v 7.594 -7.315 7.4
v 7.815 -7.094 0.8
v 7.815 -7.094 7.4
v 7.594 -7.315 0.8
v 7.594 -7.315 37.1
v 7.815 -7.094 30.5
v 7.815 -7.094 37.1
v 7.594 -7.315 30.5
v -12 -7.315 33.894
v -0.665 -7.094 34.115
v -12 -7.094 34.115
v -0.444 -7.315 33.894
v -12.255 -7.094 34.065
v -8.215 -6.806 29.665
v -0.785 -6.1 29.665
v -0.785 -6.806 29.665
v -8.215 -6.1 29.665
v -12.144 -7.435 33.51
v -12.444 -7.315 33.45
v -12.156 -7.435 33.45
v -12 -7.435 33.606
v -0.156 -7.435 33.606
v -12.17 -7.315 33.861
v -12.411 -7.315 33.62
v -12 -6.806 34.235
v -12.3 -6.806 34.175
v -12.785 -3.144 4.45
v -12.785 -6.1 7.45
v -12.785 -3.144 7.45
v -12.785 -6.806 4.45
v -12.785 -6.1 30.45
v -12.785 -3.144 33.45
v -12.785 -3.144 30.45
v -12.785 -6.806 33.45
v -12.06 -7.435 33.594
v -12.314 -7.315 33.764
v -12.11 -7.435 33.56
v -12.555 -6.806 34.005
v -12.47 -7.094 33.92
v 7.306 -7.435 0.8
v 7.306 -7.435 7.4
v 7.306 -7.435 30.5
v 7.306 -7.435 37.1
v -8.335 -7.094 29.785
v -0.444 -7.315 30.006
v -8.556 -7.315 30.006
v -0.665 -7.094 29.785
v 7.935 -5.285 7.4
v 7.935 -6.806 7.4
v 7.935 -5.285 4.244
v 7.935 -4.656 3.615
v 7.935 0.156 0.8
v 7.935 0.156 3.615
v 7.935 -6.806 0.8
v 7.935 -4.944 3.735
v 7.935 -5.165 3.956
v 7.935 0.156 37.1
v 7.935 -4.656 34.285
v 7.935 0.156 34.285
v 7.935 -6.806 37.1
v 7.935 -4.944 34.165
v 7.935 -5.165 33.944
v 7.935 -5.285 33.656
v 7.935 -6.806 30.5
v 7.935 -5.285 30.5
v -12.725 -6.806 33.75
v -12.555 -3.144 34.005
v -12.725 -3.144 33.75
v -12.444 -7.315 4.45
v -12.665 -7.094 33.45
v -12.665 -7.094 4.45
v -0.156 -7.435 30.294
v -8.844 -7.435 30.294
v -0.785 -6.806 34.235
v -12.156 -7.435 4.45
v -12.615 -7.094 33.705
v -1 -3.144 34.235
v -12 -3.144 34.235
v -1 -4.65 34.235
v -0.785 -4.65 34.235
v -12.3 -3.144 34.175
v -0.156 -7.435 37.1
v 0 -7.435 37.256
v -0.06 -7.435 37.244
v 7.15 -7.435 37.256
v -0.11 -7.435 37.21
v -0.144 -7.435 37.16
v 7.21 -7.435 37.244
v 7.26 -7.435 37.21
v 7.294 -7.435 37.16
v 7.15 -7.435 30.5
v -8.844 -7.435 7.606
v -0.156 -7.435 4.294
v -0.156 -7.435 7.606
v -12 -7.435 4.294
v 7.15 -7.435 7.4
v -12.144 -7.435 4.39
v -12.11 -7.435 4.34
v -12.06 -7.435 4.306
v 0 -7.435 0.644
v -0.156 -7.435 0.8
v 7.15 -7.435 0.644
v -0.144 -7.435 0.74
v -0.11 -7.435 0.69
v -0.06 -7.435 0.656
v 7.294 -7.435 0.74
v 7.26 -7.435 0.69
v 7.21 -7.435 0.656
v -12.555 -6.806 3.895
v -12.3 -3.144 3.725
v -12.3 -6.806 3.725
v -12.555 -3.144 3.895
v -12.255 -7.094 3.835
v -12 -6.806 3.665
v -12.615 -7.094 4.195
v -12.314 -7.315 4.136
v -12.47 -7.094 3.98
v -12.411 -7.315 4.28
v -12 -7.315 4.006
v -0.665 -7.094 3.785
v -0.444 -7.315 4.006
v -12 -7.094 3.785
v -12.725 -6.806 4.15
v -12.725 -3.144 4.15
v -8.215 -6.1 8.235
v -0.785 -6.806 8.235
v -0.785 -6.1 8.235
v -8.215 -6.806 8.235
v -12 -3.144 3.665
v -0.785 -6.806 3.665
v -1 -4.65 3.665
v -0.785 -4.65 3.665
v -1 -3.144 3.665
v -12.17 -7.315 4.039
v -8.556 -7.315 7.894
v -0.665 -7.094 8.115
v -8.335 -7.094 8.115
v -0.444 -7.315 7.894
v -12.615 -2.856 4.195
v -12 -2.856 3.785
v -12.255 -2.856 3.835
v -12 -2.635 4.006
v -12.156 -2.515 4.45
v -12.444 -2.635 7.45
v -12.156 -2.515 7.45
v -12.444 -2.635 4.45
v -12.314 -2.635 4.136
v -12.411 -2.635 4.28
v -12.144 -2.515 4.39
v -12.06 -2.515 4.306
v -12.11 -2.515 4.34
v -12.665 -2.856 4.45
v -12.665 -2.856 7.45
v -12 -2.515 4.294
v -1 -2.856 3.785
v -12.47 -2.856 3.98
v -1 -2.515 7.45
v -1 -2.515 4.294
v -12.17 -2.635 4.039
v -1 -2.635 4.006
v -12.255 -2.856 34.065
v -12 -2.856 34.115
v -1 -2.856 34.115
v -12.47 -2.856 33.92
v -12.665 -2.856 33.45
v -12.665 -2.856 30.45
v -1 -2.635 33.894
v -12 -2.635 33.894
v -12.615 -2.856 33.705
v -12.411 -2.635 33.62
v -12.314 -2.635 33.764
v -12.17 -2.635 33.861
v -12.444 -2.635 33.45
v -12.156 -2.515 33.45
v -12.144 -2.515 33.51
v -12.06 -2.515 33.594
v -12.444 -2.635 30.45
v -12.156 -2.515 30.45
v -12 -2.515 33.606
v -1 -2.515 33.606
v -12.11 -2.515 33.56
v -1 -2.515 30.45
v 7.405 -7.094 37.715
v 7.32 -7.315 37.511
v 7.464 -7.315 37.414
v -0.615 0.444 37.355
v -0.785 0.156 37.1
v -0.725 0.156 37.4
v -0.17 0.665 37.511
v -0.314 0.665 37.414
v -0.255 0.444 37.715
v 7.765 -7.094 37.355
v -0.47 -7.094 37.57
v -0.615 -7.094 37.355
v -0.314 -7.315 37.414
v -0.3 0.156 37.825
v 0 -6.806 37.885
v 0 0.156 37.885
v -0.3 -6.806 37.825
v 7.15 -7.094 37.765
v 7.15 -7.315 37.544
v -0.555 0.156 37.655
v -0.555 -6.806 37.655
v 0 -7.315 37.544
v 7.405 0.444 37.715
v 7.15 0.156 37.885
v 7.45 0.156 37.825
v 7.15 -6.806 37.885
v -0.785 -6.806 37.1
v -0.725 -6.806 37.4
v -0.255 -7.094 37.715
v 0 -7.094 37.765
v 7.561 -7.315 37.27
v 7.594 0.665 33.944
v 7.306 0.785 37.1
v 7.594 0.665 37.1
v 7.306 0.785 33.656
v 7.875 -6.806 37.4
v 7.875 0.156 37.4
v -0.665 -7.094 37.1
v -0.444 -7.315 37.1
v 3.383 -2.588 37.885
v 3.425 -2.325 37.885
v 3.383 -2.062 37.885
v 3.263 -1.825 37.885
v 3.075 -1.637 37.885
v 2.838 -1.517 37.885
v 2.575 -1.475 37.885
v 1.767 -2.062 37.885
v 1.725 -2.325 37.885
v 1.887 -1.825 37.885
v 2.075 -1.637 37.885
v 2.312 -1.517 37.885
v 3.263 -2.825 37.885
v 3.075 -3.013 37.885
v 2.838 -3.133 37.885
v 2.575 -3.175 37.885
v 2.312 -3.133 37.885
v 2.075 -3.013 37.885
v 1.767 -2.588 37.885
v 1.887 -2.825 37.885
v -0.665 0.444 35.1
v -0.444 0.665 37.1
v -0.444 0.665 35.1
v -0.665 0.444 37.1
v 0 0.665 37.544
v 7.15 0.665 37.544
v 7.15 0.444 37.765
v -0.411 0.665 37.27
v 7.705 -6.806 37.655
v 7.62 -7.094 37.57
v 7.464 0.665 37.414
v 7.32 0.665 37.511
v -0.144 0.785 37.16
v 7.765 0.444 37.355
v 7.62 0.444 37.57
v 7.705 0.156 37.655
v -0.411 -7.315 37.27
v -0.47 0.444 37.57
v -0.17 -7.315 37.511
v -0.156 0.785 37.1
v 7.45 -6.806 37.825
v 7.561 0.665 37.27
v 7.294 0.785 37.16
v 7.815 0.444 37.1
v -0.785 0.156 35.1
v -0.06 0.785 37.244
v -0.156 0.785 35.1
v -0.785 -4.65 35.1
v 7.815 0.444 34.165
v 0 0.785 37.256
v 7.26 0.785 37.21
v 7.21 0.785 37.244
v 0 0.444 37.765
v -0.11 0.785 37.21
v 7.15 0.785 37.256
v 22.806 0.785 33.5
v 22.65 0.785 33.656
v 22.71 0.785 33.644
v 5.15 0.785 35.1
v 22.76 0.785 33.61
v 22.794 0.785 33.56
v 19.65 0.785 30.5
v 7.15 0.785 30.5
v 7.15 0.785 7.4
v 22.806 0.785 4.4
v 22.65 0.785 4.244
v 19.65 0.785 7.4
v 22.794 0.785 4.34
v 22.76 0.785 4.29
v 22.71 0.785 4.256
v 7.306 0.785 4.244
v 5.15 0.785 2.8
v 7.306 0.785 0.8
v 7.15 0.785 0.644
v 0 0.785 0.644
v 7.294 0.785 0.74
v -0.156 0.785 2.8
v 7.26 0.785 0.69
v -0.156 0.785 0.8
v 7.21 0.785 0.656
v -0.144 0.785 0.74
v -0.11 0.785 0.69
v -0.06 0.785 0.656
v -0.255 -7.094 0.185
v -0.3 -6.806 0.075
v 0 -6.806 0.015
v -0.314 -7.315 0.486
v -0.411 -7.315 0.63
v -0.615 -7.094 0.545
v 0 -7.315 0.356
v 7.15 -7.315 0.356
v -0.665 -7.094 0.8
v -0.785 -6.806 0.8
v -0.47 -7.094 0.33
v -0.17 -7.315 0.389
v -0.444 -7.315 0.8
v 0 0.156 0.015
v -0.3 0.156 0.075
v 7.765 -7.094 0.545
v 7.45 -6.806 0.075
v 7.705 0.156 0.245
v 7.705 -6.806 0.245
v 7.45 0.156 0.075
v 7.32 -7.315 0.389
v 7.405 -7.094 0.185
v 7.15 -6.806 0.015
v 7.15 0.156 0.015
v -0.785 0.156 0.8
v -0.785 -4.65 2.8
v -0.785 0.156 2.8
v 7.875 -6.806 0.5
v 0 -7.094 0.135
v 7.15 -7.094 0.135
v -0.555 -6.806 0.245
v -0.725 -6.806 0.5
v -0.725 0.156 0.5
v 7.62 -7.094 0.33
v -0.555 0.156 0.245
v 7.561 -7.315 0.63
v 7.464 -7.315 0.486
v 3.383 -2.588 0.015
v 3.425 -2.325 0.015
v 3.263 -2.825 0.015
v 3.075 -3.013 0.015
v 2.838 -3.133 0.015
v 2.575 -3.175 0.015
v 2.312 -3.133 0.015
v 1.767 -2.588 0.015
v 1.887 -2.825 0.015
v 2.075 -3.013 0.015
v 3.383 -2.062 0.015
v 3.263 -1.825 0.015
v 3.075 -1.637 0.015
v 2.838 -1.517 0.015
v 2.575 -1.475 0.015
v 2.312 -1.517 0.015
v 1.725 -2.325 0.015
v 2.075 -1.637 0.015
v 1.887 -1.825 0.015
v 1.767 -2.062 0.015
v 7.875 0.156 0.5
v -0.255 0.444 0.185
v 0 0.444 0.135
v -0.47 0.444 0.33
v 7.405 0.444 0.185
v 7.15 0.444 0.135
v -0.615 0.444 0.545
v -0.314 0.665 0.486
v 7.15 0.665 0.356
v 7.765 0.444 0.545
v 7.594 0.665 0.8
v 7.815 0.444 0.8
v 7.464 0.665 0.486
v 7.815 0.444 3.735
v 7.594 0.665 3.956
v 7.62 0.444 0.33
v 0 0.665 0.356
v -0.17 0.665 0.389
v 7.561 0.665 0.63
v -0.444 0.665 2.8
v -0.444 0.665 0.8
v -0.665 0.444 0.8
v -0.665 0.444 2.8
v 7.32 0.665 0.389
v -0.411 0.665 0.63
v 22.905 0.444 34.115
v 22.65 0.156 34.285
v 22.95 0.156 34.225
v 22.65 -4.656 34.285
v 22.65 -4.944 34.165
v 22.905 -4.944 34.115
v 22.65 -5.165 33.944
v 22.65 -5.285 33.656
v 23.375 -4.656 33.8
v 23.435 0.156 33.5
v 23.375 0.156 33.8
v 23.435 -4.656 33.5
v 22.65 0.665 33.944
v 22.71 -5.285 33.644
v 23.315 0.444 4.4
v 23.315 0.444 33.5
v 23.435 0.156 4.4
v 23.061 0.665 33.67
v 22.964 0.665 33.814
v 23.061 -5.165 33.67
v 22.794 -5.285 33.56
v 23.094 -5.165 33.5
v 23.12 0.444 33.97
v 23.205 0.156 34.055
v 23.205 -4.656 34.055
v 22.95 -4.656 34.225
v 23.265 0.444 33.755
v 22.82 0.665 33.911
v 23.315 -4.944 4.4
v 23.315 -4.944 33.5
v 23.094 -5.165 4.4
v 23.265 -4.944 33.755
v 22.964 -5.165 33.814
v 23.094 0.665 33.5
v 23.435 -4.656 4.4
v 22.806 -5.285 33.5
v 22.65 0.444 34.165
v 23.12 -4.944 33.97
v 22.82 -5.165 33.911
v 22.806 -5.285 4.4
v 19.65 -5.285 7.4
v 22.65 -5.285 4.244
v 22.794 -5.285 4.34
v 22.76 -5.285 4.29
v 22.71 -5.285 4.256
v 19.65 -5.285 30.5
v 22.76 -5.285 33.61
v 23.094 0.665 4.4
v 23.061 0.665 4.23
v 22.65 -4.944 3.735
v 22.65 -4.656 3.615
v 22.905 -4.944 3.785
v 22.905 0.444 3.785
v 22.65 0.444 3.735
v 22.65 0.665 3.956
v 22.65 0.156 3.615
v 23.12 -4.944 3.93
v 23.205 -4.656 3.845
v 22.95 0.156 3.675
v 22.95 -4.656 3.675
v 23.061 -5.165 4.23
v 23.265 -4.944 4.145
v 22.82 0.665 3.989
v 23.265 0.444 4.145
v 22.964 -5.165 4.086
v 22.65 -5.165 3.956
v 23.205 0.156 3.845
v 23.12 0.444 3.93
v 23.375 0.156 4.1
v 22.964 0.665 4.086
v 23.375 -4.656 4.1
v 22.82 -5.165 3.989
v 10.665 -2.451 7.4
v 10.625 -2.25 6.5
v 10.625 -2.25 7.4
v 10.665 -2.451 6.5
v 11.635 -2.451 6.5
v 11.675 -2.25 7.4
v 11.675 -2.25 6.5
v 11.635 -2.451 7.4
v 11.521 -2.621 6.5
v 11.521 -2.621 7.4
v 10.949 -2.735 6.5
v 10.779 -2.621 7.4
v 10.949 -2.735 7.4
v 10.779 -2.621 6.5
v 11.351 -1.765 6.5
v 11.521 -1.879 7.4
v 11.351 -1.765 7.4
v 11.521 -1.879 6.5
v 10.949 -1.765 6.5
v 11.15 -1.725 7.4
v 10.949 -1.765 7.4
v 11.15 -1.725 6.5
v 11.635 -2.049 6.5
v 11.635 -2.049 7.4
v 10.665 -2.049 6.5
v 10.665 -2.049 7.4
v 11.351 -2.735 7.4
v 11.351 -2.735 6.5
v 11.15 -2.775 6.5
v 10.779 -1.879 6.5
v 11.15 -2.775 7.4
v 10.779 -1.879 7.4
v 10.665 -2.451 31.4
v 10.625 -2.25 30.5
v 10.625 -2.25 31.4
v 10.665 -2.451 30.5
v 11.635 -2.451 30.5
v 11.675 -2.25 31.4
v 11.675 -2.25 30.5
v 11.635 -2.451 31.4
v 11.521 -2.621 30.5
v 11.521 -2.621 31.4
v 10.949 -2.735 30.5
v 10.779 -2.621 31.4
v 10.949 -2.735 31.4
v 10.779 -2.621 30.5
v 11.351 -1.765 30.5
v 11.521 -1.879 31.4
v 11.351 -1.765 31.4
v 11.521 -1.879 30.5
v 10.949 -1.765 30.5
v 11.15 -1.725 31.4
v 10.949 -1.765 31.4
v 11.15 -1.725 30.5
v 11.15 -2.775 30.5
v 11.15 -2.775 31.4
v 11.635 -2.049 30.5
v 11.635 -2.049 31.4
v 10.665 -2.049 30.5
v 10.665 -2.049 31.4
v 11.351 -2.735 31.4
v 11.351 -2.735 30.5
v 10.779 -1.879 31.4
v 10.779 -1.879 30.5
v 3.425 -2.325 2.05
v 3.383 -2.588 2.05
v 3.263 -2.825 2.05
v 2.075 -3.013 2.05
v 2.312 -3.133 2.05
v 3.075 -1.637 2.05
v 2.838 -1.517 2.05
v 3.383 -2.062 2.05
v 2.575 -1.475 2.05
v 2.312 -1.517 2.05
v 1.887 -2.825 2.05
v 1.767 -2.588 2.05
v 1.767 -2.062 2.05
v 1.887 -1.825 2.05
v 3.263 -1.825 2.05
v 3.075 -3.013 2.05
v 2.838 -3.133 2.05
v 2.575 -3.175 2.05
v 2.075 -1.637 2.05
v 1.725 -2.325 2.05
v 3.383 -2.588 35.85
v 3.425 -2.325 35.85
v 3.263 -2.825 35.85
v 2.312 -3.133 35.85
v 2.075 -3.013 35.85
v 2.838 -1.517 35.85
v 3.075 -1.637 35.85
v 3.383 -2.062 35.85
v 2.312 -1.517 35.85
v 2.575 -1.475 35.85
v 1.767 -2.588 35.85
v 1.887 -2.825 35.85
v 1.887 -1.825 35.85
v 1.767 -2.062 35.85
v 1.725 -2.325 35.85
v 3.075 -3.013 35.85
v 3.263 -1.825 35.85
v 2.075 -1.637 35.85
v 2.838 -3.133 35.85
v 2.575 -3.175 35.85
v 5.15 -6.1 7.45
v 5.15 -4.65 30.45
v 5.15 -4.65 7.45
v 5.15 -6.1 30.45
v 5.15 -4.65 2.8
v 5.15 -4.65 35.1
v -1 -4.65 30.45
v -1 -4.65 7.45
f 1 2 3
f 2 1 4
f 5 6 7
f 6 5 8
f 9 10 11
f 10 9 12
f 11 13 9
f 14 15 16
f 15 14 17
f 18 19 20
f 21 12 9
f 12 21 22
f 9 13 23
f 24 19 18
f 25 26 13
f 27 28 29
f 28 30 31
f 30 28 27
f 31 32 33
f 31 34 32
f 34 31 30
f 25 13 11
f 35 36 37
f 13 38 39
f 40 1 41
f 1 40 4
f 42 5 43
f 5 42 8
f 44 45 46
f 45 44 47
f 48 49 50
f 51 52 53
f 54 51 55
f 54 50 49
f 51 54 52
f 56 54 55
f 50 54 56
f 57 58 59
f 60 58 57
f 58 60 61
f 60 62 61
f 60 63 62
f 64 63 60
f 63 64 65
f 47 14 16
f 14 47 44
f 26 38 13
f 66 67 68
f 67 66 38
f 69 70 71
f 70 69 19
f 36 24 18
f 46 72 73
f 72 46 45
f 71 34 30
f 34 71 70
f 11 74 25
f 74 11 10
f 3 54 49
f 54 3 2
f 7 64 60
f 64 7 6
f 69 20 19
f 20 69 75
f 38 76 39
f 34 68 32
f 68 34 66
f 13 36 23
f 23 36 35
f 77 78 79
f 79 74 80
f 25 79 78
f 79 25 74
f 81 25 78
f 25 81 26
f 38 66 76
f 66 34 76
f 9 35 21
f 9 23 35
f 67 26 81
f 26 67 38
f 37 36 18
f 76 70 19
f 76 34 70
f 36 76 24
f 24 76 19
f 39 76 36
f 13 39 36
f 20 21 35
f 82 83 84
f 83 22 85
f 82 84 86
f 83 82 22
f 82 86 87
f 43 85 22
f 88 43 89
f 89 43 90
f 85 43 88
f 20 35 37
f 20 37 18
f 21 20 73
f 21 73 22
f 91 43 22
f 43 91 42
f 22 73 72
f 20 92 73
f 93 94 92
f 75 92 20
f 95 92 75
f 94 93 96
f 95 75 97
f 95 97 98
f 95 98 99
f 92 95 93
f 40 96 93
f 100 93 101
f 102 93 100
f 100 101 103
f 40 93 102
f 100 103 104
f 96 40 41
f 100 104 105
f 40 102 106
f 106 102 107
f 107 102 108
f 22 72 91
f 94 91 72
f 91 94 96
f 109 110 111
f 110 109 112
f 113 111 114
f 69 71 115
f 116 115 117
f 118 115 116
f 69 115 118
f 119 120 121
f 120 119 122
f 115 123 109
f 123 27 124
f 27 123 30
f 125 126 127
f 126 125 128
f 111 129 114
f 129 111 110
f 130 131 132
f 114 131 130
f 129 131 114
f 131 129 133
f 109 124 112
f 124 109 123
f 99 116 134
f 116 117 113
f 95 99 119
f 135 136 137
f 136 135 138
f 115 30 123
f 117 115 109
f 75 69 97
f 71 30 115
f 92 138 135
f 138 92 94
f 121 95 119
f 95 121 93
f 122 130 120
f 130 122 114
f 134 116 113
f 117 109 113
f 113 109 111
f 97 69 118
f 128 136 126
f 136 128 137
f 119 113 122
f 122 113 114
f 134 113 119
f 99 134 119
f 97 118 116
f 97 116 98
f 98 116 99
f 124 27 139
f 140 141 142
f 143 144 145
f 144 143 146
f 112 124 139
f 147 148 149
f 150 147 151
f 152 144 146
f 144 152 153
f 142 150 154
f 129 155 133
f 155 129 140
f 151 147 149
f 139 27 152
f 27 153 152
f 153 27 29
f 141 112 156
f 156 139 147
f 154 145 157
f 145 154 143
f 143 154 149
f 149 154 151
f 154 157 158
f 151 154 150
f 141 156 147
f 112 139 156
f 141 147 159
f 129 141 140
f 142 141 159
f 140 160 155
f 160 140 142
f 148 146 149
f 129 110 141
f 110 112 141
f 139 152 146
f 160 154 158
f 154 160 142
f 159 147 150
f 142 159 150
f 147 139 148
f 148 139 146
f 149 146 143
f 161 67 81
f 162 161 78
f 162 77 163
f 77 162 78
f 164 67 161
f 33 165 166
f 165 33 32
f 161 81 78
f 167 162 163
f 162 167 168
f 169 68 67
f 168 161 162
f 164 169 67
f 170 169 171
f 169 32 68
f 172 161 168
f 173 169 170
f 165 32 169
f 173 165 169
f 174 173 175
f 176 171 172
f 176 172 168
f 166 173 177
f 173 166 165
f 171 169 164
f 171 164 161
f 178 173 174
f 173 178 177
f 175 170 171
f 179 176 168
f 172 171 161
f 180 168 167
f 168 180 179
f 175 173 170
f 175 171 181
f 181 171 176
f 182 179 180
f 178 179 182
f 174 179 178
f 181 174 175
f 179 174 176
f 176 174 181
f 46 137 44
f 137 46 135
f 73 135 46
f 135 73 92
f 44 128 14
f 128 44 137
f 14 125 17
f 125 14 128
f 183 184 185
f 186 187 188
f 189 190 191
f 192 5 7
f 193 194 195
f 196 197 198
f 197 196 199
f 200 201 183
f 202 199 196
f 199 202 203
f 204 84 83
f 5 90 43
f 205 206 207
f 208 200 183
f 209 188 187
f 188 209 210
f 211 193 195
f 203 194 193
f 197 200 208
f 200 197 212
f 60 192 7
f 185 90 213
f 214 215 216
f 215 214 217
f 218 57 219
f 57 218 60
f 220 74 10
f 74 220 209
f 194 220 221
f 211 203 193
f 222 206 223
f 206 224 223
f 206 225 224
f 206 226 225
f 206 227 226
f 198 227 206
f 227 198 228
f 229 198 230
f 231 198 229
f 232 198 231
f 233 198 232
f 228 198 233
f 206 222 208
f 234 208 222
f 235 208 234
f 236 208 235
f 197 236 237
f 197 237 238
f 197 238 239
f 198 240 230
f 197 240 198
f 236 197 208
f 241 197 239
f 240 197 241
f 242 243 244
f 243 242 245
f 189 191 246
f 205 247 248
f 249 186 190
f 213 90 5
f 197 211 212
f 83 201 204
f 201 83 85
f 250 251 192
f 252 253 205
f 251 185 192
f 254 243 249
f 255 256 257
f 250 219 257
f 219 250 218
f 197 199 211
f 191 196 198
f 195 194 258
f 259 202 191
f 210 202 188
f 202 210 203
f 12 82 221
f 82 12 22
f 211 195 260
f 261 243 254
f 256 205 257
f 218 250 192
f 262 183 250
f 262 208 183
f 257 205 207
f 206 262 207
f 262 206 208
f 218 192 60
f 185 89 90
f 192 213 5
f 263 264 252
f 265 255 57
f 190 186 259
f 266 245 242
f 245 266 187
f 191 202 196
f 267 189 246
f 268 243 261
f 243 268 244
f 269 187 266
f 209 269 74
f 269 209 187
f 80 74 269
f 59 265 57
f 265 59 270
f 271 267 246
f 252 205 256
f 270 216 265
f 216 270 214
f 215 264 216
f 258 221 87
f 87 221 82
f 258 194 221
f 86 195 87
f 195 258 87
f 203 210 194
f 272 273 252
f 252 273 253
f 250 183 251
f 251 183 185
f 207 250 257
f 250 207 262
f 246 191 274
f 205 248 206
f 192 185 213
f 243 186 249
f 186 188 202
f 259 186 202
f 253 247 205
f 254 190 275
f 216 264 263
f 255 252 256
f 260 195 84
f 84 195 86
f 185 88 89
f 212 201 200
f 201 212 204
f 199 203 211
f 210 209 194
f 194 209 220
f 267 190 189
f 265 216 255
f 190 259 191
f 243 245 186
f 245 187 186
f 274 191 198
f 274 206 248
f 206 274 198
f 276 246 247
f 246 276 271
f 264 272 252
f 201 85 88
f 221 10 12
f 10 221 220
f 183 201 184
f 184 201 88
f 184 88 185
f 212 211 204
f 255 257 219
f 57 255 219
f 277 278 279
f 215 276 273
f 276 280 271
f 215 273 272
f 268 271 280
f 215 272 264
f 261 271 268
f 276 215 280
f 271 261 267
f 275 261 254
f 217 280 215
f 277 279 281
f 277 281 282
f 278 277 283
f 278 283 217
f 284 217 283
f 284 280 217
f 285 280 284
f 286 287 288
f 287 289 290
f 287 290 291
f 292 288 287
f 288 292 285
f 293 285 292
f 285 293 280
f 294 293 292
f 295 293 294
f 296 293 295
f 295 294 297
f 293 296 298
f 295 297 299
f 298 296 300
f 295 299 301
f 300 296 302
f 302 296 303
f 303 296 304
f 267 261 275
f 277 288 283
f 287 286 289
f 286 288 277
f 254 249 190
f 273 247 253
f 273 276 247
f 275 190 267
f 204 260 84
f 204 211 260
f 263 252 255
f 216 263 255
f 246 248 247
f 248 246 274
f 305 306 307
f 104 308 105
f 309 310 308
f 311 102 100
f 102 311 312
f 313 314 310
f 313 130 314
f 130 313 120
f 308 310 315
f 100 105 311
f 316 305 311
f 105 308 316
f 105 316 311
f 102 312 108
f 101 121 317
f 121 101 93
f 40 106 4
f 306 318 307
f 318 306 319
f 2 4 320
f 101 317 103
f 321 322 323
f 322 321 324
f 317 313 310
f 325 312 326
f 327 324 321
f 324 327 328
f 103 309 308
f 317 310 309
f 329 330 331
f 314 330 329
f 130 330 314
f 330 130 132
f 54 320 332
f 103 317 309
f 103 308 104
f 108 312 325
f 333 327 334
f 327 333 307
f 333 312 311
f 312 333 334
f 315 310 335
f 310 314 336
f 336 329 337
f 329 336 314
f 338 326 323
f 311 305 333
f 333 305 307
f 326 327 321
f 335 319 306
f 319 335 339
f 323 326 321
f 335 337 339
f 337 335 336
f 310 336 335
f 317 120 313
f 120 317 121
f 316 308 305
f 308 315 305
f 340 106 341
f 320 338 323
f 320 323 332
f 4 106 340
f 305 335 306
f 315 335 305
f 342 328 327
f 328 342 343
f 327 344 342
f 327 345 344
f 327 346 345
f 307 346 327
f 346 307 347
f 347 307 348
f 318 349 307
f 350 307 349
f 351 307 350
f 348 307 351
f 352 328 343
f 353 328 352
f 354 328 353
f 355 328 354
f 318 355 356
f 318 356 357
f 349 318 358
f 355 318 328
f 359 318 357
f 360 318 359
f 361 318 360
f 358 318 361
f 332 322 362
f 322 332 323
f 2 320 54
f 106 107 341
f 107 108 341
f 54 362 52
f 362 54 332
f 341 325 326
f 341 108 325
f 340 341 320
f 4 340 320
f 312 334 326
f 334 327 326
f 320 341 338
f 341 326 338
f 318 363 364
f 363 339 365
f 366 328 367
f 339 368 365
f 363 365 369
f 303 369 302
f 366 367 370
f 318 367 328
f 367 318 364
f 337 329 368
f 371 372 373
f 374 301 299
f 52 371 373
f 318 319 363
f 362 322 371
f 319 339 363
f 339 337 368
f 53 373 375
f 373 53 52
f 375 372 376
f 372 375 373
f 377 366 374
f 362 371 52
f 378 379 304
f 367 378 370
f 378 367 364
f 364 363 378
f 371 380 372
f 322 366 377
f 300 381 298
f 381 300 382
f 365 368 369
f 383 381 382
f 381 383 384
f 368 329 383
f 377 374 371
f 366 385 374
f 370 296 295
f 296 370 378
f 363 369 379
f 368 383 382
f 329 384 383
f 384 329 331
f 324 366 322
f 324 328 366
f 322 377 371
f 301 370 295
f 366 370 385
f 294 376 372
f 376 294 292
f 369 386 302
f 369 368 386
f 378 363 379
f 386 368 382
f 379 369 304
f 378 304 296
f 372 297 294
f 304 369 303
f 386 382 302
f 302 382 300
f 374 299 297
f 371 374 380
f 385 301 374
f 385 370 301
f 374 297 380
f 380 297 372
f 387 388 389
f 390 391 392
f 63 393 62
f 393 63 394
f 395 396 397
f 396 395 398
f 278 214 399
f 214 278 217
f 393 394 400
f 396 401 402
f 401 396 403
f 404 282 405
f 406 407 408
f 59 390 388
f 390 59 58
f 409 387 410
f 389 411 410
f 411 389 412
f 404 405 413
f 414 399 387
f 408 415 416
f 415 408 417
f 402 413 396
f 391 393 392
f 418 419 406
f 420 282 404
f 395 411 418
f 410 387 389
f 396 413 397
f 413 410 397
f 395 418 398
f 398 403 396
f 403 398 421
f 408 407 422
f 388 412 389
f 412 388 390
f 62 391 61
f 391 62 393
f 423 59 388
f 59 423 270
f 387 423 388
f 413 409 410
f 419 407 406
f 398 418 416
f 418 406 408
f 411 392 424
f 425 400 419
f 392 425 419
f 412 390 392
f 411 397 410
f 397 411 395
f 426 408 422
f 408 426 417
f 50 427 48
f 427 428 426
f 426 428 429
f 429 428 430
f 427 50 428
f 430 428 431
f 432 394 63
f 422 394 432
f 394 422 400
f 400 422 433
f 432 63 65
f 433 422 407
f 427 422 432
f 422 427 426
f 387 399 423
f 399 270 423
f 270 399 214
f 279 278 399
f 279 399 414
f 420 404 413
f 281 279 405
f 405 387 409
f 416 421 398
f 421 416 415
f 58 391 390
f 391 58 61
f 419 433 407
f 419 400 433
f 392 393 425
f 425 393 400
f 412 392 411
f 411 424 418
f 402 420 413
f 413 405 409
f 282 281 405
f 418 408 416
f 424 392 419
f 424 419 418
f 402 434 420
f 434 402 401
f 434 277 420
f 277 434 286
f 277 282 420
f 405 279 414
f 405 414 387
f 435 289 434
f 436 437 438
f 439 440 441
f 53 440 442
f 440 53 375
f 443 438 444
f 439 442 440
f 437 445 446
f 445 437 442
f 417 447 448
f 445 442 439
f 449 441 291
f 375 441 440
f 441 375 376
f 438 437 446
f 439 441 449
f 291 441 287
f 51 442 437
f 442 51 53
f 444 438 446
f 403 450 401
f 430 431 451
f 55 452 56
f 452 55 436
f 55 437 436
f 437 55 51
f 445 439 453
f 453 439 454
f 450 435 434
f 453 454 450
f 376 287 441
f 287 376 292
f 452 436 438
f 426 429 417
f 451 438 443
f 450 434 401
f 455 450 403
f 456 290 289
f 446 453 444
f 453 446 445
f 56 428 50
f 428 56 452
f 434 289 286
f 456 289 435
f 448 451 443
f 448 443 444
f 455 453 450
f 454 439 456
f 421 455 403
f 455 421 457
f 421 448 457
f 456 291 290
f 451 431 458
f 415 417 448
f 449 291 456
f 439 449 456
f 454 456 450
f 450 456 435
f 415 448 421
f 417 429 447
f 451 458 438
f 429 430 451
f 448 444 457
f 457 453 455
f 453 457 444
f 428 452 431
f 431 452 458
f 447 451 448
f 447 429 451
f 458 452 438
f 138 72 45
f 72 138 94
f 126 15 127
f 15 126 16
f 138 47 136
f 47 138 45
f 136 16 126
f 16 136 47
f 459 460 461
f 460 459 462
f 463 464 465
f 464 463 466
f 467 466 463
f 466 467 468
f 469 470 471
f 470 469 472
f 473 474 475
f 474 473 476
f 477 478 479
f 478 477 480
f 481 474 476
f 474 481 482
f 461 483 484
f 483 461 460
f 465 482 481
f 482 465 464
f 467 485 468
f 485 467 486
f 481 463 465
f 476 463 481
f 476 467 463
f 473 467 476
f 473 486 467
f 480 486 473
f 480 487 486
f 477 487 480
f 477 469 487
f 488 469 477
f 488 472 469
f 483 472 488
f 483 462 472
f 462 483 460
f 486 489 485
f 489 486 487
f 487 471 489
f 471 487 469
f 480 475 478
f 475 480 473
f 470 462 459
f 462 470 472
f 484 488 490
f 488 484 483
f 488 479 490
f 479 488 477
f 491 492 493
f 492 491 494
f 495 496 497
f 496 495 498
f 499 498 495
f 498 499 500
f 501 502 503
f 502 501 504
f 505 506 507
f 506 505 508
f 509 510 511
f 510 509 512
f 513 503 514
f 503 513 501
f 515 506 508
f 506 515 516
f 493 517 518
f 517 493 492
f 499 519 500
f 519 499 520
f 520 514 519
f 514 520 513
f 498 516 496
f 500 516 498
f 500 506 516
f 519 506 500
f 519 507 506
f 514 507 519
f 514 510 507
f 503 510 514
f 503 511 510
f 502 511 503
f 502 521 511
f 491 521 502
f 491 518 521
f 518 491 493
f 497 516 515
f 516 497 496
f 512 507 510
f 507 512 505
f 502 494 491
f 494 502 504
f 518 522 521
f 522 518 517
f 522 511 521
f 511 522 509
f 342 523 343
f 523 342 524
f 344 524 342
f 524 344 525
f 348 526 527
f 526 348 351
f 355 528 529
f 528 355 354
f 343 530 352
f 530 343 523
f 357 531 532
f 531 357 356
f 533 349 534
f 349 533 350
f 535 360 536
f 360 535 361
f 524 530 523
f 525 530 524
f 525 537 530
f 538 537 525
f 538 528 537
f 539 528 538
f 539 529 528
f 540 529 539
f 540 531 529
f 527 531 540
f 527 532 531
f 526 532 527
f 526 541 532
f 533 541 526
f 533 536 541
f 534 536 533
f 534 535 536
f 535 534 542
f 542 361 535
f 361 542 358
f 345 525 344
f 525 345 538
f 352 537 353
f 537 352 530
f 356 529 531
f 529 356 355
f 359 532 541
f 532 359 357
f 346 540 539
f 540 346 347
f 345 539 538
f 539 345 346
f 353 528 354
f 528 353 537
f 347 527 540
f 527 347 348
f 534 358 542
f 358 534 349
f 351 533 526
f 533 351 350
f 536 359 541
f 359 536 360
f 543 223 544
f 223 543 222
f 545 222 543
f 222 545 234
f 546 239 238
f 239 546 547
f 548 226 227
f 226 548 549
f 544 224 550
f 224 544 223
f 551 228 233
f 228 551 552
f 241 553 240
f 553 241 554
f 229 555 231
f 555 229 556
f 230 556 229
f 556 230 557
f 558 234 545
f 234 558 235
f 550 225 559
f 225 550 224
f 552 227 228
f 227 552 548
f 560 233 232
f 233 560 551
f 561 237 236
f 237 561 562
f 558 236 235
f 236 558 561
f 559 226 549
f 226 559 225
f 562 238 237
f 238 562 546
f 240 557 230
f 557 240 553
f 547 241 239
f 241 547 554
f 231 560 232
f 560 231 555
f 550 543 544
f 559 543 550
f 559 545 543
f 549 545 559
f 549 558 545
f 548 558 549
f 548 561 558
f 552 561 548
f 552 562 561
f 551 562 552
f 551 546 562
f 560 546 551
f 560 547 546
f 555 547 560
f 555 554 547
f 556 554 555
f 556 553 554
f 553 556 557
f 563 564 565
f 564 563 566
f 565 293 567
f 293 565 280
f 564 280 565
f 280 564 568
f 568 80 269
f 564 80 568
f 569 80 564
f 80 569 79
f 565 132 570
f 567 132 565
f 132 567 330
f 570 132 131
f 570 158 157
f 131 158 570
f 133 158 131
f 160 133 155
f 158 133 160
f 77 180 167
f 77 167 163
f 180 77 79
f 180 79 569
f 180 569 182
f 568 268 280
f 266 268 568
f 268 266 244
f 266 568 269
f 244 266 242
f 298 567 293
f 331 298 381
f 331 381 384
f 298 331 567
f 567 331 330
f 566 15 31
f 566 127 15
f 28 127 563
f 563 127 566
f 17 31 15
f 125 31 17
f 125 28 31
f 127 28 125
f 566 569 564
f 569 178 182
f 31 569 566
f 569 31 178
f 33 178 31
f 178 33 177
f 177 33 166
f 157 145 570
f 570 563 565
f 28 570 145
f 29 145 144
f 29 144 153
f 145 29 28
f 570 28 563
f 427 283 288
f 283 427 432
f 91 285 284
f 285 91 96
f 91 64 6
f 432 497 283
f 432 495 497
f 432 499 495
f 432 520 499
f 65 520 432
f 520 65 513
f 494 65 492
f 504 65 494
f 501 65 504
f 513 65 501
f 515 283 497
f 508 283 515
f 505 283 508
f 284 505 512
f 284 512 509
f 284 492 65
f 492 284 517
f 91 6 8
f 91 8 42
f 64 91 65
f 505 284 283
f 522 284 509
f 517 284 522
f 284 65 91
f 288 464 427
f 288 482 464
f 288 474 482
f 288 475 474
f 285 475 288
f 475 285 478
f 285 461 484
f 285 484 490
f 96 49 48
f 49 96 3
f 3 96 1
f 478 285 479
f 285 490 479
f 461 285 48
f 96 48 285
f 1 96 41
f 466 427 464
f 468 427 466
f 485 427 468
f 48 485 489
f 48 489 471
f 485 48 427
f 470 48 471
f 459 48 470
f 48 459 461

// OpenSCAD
// Tang buckle for the v5 band: caps the cast-in PETG plate at the short strap's end and gives the
// band a normal watch buckle sized for its 22 mm width. Pivot = the Tropic strap's
// 22 mm spring bar (24.5 tip to tip, 2.5 body); tongue printed. A fixed keeper bridge behind the cap holds the tail.
//
// Prep the band: snip the frame's rails and crossbar off flush with the plate's outer face, file
// the stubs flat. Fit: slide the cap over the plate, CA glue, optionally pin through the side holes.
// Then hook the tongue's loop over the spring bar, compress the bar into the two lug holes.
//
// Wear: long strap comes round under the wrist, goes UNDER the far bar, UP through the frame
// opening, the tongue goes out through a hole, and the tail runs over the pivot bar, under the
// keeper bridge and along the top of the short strap. Like a watch.
//
// Print: PETG, as exported (on its side), 100% infill, 250-255 C, low fan, supports on.

/* [Plate on the band (measure yours)] */
plate_w = 32.0; plate_t = 5.0; plate_h = 4.5; plate_z0 = 3.0; clr = 0.15;

/* [Band] */
strap_w = 22.0; strap_t = 2.8; strap_top = 5.8;   // strap_top: top of the lifted strap end above the wrist face

/* [Hardware] */
tongue_len = 12.0;   // printed tongue, bar centre to tip (sets the far bar too)
bar_tip_d = 0.8; bar_hole_depth = 0.9; bar_d = 2.5;   // the Tropic's STRAP spring bar: 24.5 tip to tip extended, 2.5 body, 0.8 tips
bar_len = 24.5;
LUG_IN = bar_len - 2 * (bar_hole_depth - 0.2);         // lug inner faces 23.1 apart: tips seat 0.7 deep when the bar is extended
tongue_w = 3.0; tongue_t = 2.0; ring_wall = 1.6;        // printed tongue

/* [Buckle] */
wall = 2.0; top = 2.0;          // cap walls
lug_t = 3.0; rail_w = 3.0; far_t = 3.0; fr_h = 4.5;   // frame section
bar_from_face = 4.0;            // pivot bar centre beyond the cap's outer face
keeper_back = 9.0; keeper_t = 3.0; keeper_gap = 3.3;
r = 0.8;

$fn = 40; eps = 0.01;
PW = plate_w + 2 * clr; PT = plate_t + clr; PH = plate_h + clr; OW = PW + 2 * wall;
IW = LUG_IN;                              // frame inner width = lug spacing (23.1, clears the 22 strap)
FW = IW + 2 * rail_w;                     // frame outer width
X_FACE = PT + wall;                       // cap's outer face
X_BAR = X_FACE + bar_from_face;           // pivot bar
X_FAR = X_BAR + tongue_len - far_t / 2 - 0.5;   // far bar: the tongue tip reaches 0.5 past its outer face
Z0 = 0; ZT = PH + top;                    // frame occupies z 0..PH (like the plate), cap top to ZT
module cap_raw() {
    translate([0, -OW / 2, PH]) cube([X_FACE, OW, top]);                                   // top wall
    translate([PT, -OW / 2, 0]) cube([wall, OW, PH + top]);                                // outer face wall
    for (s = [-1, 1]) translate([0, s * (OW / 2 - wall / 2) - wall / 2, 0]) cube([X_FACE, wall, PH + top]);   // side walls
}
module frame_raw() {
    for (s = [-1, 1]) translate([X_FACE - eps, s * (FW / 2 - rail_w / 2) - rail_w / 2, 0]) cube([X_FAR + far_t / 2 - X_FACE + eps, rail_w, fr_h]);   // rails
    translate([X_FAR - far_t / 2, -FW / 2, 0]) cube([far_t, FW, fr_h]);                    // far bar
}
module keeper_raw() {
    // arms back along the strap's edges from the cap's top wall, and a bridge over the strap
    for (s = [-1, 1]) translate([-keeper_back - keeper_t, s * (strap_w / 2 + 0.5 + keeper_t / 2) - keeper_t / 2, strap_top - plate_z0 + 0.5]) cube([keeper_back + keeper_t + eps, keeper_t, ZT - (strap_top - plate_z0 + 0.5)]);
    translate([-keeper_back - keeper_t, -(strap_w / 2 + 0.5 + keeper_t), strap_top - plate_z0 + keeper_gap]) cube([keeper_t, strap_w + 1 + 2 * keeper_t, ZT - (strap_top - plate_z0 + keeper_gap)]);
}
module part() {
    difference() {
        minkowski() { union() { cap_raw(); frame_raw(); keeper_raw(); } sphere(r = r, $fn = 16); }
        translate([-1, -PW / 2, -1]) cube([PT + 1, PW, PH + 1]);                            // plate pocket (open toward the strap and below)
        translate([-50, -50, -50]) cube([100, 100, 50 - r]);                                 // nothing below the frame's underside plane (keeps the tail passage)
        translate([-50, -(strap_w / 2 + 0.5), -1]) cube([50 + PT, strap_w + 1, 1 + strap_top - plate_z0 + keeper_gap]);   // strap + keeper passage behind the cap
        translate([X_FACE, -IW / 2, -1]) cube([X_FAR - far_t / 2 - X_FACE, IW, 60]);              // frame opening, full inner width; bar free between the lugs
        translate([-50, -50, -50]) cube([50 - keeper_back - keeper_t - r - eps, 100, 100]);  // trim
        // spring bar seats: blind holes in the lugs' inner faces
        for (s = [-1, 1]) translate([X_BAR, s * (LUG_IN / 2 + bar_hole_depth / 2 - eps), fr_h / 2]) rotate([90, 0, 0]) cylinder(d = bar_tip_d + 0.25, h = bar_hole_depth + 2 * eps, center = true, $fn = 16);
        // pin holes through the cap's side walls into the plate ends
        for (s = [-1, 1]) translate([PT / 2, s * (OW / 2 + 1), PH / 2]) rotate([90, 0, 0]) cylinder(d = 1.7, h = wall + 2.5, center = true, $fn = 20);
        // round the far bar's top edge where the strap bends over it
    }
}
// printed tongue: ring on the bar, tapered arm to just past the far bar, rounded tip
module tongue() {
    ring_od = bar_d + 0.3 + 2 * ring_wall;
    difference() {
        union() {
            rotate([90, 0, 0]) cylinder(d = ring_od, h = tongue_w, center = true);
            hull() {
                rotate([90, 0, 0]) cylinder(d = tongue_t, h = tongue_w, center = true);
                translate([tongue_len - 1.0, 0, -0.3]) rotate([90, 0, 0]) cylinder(d = tongue_t - 0.4, h = tongue_w - 0.8, center = true);
            }
        }
        rotate([90, 0, 0]) cylinder(d = bar_d + 0.3, h = 10, center = true);
    }
}
part_sel = "buckle"; // [buckle, tongue]
if (part_sel == "tongue") translate([0, 0, tongue_w / 2]) rotate([90, 0, 0]) tongue();   // flat: ring axis vertical
else translate([0, 0, OW / 2 + r]) rotate([90, 0, 0]) part();              // buckle on its side; supports on
